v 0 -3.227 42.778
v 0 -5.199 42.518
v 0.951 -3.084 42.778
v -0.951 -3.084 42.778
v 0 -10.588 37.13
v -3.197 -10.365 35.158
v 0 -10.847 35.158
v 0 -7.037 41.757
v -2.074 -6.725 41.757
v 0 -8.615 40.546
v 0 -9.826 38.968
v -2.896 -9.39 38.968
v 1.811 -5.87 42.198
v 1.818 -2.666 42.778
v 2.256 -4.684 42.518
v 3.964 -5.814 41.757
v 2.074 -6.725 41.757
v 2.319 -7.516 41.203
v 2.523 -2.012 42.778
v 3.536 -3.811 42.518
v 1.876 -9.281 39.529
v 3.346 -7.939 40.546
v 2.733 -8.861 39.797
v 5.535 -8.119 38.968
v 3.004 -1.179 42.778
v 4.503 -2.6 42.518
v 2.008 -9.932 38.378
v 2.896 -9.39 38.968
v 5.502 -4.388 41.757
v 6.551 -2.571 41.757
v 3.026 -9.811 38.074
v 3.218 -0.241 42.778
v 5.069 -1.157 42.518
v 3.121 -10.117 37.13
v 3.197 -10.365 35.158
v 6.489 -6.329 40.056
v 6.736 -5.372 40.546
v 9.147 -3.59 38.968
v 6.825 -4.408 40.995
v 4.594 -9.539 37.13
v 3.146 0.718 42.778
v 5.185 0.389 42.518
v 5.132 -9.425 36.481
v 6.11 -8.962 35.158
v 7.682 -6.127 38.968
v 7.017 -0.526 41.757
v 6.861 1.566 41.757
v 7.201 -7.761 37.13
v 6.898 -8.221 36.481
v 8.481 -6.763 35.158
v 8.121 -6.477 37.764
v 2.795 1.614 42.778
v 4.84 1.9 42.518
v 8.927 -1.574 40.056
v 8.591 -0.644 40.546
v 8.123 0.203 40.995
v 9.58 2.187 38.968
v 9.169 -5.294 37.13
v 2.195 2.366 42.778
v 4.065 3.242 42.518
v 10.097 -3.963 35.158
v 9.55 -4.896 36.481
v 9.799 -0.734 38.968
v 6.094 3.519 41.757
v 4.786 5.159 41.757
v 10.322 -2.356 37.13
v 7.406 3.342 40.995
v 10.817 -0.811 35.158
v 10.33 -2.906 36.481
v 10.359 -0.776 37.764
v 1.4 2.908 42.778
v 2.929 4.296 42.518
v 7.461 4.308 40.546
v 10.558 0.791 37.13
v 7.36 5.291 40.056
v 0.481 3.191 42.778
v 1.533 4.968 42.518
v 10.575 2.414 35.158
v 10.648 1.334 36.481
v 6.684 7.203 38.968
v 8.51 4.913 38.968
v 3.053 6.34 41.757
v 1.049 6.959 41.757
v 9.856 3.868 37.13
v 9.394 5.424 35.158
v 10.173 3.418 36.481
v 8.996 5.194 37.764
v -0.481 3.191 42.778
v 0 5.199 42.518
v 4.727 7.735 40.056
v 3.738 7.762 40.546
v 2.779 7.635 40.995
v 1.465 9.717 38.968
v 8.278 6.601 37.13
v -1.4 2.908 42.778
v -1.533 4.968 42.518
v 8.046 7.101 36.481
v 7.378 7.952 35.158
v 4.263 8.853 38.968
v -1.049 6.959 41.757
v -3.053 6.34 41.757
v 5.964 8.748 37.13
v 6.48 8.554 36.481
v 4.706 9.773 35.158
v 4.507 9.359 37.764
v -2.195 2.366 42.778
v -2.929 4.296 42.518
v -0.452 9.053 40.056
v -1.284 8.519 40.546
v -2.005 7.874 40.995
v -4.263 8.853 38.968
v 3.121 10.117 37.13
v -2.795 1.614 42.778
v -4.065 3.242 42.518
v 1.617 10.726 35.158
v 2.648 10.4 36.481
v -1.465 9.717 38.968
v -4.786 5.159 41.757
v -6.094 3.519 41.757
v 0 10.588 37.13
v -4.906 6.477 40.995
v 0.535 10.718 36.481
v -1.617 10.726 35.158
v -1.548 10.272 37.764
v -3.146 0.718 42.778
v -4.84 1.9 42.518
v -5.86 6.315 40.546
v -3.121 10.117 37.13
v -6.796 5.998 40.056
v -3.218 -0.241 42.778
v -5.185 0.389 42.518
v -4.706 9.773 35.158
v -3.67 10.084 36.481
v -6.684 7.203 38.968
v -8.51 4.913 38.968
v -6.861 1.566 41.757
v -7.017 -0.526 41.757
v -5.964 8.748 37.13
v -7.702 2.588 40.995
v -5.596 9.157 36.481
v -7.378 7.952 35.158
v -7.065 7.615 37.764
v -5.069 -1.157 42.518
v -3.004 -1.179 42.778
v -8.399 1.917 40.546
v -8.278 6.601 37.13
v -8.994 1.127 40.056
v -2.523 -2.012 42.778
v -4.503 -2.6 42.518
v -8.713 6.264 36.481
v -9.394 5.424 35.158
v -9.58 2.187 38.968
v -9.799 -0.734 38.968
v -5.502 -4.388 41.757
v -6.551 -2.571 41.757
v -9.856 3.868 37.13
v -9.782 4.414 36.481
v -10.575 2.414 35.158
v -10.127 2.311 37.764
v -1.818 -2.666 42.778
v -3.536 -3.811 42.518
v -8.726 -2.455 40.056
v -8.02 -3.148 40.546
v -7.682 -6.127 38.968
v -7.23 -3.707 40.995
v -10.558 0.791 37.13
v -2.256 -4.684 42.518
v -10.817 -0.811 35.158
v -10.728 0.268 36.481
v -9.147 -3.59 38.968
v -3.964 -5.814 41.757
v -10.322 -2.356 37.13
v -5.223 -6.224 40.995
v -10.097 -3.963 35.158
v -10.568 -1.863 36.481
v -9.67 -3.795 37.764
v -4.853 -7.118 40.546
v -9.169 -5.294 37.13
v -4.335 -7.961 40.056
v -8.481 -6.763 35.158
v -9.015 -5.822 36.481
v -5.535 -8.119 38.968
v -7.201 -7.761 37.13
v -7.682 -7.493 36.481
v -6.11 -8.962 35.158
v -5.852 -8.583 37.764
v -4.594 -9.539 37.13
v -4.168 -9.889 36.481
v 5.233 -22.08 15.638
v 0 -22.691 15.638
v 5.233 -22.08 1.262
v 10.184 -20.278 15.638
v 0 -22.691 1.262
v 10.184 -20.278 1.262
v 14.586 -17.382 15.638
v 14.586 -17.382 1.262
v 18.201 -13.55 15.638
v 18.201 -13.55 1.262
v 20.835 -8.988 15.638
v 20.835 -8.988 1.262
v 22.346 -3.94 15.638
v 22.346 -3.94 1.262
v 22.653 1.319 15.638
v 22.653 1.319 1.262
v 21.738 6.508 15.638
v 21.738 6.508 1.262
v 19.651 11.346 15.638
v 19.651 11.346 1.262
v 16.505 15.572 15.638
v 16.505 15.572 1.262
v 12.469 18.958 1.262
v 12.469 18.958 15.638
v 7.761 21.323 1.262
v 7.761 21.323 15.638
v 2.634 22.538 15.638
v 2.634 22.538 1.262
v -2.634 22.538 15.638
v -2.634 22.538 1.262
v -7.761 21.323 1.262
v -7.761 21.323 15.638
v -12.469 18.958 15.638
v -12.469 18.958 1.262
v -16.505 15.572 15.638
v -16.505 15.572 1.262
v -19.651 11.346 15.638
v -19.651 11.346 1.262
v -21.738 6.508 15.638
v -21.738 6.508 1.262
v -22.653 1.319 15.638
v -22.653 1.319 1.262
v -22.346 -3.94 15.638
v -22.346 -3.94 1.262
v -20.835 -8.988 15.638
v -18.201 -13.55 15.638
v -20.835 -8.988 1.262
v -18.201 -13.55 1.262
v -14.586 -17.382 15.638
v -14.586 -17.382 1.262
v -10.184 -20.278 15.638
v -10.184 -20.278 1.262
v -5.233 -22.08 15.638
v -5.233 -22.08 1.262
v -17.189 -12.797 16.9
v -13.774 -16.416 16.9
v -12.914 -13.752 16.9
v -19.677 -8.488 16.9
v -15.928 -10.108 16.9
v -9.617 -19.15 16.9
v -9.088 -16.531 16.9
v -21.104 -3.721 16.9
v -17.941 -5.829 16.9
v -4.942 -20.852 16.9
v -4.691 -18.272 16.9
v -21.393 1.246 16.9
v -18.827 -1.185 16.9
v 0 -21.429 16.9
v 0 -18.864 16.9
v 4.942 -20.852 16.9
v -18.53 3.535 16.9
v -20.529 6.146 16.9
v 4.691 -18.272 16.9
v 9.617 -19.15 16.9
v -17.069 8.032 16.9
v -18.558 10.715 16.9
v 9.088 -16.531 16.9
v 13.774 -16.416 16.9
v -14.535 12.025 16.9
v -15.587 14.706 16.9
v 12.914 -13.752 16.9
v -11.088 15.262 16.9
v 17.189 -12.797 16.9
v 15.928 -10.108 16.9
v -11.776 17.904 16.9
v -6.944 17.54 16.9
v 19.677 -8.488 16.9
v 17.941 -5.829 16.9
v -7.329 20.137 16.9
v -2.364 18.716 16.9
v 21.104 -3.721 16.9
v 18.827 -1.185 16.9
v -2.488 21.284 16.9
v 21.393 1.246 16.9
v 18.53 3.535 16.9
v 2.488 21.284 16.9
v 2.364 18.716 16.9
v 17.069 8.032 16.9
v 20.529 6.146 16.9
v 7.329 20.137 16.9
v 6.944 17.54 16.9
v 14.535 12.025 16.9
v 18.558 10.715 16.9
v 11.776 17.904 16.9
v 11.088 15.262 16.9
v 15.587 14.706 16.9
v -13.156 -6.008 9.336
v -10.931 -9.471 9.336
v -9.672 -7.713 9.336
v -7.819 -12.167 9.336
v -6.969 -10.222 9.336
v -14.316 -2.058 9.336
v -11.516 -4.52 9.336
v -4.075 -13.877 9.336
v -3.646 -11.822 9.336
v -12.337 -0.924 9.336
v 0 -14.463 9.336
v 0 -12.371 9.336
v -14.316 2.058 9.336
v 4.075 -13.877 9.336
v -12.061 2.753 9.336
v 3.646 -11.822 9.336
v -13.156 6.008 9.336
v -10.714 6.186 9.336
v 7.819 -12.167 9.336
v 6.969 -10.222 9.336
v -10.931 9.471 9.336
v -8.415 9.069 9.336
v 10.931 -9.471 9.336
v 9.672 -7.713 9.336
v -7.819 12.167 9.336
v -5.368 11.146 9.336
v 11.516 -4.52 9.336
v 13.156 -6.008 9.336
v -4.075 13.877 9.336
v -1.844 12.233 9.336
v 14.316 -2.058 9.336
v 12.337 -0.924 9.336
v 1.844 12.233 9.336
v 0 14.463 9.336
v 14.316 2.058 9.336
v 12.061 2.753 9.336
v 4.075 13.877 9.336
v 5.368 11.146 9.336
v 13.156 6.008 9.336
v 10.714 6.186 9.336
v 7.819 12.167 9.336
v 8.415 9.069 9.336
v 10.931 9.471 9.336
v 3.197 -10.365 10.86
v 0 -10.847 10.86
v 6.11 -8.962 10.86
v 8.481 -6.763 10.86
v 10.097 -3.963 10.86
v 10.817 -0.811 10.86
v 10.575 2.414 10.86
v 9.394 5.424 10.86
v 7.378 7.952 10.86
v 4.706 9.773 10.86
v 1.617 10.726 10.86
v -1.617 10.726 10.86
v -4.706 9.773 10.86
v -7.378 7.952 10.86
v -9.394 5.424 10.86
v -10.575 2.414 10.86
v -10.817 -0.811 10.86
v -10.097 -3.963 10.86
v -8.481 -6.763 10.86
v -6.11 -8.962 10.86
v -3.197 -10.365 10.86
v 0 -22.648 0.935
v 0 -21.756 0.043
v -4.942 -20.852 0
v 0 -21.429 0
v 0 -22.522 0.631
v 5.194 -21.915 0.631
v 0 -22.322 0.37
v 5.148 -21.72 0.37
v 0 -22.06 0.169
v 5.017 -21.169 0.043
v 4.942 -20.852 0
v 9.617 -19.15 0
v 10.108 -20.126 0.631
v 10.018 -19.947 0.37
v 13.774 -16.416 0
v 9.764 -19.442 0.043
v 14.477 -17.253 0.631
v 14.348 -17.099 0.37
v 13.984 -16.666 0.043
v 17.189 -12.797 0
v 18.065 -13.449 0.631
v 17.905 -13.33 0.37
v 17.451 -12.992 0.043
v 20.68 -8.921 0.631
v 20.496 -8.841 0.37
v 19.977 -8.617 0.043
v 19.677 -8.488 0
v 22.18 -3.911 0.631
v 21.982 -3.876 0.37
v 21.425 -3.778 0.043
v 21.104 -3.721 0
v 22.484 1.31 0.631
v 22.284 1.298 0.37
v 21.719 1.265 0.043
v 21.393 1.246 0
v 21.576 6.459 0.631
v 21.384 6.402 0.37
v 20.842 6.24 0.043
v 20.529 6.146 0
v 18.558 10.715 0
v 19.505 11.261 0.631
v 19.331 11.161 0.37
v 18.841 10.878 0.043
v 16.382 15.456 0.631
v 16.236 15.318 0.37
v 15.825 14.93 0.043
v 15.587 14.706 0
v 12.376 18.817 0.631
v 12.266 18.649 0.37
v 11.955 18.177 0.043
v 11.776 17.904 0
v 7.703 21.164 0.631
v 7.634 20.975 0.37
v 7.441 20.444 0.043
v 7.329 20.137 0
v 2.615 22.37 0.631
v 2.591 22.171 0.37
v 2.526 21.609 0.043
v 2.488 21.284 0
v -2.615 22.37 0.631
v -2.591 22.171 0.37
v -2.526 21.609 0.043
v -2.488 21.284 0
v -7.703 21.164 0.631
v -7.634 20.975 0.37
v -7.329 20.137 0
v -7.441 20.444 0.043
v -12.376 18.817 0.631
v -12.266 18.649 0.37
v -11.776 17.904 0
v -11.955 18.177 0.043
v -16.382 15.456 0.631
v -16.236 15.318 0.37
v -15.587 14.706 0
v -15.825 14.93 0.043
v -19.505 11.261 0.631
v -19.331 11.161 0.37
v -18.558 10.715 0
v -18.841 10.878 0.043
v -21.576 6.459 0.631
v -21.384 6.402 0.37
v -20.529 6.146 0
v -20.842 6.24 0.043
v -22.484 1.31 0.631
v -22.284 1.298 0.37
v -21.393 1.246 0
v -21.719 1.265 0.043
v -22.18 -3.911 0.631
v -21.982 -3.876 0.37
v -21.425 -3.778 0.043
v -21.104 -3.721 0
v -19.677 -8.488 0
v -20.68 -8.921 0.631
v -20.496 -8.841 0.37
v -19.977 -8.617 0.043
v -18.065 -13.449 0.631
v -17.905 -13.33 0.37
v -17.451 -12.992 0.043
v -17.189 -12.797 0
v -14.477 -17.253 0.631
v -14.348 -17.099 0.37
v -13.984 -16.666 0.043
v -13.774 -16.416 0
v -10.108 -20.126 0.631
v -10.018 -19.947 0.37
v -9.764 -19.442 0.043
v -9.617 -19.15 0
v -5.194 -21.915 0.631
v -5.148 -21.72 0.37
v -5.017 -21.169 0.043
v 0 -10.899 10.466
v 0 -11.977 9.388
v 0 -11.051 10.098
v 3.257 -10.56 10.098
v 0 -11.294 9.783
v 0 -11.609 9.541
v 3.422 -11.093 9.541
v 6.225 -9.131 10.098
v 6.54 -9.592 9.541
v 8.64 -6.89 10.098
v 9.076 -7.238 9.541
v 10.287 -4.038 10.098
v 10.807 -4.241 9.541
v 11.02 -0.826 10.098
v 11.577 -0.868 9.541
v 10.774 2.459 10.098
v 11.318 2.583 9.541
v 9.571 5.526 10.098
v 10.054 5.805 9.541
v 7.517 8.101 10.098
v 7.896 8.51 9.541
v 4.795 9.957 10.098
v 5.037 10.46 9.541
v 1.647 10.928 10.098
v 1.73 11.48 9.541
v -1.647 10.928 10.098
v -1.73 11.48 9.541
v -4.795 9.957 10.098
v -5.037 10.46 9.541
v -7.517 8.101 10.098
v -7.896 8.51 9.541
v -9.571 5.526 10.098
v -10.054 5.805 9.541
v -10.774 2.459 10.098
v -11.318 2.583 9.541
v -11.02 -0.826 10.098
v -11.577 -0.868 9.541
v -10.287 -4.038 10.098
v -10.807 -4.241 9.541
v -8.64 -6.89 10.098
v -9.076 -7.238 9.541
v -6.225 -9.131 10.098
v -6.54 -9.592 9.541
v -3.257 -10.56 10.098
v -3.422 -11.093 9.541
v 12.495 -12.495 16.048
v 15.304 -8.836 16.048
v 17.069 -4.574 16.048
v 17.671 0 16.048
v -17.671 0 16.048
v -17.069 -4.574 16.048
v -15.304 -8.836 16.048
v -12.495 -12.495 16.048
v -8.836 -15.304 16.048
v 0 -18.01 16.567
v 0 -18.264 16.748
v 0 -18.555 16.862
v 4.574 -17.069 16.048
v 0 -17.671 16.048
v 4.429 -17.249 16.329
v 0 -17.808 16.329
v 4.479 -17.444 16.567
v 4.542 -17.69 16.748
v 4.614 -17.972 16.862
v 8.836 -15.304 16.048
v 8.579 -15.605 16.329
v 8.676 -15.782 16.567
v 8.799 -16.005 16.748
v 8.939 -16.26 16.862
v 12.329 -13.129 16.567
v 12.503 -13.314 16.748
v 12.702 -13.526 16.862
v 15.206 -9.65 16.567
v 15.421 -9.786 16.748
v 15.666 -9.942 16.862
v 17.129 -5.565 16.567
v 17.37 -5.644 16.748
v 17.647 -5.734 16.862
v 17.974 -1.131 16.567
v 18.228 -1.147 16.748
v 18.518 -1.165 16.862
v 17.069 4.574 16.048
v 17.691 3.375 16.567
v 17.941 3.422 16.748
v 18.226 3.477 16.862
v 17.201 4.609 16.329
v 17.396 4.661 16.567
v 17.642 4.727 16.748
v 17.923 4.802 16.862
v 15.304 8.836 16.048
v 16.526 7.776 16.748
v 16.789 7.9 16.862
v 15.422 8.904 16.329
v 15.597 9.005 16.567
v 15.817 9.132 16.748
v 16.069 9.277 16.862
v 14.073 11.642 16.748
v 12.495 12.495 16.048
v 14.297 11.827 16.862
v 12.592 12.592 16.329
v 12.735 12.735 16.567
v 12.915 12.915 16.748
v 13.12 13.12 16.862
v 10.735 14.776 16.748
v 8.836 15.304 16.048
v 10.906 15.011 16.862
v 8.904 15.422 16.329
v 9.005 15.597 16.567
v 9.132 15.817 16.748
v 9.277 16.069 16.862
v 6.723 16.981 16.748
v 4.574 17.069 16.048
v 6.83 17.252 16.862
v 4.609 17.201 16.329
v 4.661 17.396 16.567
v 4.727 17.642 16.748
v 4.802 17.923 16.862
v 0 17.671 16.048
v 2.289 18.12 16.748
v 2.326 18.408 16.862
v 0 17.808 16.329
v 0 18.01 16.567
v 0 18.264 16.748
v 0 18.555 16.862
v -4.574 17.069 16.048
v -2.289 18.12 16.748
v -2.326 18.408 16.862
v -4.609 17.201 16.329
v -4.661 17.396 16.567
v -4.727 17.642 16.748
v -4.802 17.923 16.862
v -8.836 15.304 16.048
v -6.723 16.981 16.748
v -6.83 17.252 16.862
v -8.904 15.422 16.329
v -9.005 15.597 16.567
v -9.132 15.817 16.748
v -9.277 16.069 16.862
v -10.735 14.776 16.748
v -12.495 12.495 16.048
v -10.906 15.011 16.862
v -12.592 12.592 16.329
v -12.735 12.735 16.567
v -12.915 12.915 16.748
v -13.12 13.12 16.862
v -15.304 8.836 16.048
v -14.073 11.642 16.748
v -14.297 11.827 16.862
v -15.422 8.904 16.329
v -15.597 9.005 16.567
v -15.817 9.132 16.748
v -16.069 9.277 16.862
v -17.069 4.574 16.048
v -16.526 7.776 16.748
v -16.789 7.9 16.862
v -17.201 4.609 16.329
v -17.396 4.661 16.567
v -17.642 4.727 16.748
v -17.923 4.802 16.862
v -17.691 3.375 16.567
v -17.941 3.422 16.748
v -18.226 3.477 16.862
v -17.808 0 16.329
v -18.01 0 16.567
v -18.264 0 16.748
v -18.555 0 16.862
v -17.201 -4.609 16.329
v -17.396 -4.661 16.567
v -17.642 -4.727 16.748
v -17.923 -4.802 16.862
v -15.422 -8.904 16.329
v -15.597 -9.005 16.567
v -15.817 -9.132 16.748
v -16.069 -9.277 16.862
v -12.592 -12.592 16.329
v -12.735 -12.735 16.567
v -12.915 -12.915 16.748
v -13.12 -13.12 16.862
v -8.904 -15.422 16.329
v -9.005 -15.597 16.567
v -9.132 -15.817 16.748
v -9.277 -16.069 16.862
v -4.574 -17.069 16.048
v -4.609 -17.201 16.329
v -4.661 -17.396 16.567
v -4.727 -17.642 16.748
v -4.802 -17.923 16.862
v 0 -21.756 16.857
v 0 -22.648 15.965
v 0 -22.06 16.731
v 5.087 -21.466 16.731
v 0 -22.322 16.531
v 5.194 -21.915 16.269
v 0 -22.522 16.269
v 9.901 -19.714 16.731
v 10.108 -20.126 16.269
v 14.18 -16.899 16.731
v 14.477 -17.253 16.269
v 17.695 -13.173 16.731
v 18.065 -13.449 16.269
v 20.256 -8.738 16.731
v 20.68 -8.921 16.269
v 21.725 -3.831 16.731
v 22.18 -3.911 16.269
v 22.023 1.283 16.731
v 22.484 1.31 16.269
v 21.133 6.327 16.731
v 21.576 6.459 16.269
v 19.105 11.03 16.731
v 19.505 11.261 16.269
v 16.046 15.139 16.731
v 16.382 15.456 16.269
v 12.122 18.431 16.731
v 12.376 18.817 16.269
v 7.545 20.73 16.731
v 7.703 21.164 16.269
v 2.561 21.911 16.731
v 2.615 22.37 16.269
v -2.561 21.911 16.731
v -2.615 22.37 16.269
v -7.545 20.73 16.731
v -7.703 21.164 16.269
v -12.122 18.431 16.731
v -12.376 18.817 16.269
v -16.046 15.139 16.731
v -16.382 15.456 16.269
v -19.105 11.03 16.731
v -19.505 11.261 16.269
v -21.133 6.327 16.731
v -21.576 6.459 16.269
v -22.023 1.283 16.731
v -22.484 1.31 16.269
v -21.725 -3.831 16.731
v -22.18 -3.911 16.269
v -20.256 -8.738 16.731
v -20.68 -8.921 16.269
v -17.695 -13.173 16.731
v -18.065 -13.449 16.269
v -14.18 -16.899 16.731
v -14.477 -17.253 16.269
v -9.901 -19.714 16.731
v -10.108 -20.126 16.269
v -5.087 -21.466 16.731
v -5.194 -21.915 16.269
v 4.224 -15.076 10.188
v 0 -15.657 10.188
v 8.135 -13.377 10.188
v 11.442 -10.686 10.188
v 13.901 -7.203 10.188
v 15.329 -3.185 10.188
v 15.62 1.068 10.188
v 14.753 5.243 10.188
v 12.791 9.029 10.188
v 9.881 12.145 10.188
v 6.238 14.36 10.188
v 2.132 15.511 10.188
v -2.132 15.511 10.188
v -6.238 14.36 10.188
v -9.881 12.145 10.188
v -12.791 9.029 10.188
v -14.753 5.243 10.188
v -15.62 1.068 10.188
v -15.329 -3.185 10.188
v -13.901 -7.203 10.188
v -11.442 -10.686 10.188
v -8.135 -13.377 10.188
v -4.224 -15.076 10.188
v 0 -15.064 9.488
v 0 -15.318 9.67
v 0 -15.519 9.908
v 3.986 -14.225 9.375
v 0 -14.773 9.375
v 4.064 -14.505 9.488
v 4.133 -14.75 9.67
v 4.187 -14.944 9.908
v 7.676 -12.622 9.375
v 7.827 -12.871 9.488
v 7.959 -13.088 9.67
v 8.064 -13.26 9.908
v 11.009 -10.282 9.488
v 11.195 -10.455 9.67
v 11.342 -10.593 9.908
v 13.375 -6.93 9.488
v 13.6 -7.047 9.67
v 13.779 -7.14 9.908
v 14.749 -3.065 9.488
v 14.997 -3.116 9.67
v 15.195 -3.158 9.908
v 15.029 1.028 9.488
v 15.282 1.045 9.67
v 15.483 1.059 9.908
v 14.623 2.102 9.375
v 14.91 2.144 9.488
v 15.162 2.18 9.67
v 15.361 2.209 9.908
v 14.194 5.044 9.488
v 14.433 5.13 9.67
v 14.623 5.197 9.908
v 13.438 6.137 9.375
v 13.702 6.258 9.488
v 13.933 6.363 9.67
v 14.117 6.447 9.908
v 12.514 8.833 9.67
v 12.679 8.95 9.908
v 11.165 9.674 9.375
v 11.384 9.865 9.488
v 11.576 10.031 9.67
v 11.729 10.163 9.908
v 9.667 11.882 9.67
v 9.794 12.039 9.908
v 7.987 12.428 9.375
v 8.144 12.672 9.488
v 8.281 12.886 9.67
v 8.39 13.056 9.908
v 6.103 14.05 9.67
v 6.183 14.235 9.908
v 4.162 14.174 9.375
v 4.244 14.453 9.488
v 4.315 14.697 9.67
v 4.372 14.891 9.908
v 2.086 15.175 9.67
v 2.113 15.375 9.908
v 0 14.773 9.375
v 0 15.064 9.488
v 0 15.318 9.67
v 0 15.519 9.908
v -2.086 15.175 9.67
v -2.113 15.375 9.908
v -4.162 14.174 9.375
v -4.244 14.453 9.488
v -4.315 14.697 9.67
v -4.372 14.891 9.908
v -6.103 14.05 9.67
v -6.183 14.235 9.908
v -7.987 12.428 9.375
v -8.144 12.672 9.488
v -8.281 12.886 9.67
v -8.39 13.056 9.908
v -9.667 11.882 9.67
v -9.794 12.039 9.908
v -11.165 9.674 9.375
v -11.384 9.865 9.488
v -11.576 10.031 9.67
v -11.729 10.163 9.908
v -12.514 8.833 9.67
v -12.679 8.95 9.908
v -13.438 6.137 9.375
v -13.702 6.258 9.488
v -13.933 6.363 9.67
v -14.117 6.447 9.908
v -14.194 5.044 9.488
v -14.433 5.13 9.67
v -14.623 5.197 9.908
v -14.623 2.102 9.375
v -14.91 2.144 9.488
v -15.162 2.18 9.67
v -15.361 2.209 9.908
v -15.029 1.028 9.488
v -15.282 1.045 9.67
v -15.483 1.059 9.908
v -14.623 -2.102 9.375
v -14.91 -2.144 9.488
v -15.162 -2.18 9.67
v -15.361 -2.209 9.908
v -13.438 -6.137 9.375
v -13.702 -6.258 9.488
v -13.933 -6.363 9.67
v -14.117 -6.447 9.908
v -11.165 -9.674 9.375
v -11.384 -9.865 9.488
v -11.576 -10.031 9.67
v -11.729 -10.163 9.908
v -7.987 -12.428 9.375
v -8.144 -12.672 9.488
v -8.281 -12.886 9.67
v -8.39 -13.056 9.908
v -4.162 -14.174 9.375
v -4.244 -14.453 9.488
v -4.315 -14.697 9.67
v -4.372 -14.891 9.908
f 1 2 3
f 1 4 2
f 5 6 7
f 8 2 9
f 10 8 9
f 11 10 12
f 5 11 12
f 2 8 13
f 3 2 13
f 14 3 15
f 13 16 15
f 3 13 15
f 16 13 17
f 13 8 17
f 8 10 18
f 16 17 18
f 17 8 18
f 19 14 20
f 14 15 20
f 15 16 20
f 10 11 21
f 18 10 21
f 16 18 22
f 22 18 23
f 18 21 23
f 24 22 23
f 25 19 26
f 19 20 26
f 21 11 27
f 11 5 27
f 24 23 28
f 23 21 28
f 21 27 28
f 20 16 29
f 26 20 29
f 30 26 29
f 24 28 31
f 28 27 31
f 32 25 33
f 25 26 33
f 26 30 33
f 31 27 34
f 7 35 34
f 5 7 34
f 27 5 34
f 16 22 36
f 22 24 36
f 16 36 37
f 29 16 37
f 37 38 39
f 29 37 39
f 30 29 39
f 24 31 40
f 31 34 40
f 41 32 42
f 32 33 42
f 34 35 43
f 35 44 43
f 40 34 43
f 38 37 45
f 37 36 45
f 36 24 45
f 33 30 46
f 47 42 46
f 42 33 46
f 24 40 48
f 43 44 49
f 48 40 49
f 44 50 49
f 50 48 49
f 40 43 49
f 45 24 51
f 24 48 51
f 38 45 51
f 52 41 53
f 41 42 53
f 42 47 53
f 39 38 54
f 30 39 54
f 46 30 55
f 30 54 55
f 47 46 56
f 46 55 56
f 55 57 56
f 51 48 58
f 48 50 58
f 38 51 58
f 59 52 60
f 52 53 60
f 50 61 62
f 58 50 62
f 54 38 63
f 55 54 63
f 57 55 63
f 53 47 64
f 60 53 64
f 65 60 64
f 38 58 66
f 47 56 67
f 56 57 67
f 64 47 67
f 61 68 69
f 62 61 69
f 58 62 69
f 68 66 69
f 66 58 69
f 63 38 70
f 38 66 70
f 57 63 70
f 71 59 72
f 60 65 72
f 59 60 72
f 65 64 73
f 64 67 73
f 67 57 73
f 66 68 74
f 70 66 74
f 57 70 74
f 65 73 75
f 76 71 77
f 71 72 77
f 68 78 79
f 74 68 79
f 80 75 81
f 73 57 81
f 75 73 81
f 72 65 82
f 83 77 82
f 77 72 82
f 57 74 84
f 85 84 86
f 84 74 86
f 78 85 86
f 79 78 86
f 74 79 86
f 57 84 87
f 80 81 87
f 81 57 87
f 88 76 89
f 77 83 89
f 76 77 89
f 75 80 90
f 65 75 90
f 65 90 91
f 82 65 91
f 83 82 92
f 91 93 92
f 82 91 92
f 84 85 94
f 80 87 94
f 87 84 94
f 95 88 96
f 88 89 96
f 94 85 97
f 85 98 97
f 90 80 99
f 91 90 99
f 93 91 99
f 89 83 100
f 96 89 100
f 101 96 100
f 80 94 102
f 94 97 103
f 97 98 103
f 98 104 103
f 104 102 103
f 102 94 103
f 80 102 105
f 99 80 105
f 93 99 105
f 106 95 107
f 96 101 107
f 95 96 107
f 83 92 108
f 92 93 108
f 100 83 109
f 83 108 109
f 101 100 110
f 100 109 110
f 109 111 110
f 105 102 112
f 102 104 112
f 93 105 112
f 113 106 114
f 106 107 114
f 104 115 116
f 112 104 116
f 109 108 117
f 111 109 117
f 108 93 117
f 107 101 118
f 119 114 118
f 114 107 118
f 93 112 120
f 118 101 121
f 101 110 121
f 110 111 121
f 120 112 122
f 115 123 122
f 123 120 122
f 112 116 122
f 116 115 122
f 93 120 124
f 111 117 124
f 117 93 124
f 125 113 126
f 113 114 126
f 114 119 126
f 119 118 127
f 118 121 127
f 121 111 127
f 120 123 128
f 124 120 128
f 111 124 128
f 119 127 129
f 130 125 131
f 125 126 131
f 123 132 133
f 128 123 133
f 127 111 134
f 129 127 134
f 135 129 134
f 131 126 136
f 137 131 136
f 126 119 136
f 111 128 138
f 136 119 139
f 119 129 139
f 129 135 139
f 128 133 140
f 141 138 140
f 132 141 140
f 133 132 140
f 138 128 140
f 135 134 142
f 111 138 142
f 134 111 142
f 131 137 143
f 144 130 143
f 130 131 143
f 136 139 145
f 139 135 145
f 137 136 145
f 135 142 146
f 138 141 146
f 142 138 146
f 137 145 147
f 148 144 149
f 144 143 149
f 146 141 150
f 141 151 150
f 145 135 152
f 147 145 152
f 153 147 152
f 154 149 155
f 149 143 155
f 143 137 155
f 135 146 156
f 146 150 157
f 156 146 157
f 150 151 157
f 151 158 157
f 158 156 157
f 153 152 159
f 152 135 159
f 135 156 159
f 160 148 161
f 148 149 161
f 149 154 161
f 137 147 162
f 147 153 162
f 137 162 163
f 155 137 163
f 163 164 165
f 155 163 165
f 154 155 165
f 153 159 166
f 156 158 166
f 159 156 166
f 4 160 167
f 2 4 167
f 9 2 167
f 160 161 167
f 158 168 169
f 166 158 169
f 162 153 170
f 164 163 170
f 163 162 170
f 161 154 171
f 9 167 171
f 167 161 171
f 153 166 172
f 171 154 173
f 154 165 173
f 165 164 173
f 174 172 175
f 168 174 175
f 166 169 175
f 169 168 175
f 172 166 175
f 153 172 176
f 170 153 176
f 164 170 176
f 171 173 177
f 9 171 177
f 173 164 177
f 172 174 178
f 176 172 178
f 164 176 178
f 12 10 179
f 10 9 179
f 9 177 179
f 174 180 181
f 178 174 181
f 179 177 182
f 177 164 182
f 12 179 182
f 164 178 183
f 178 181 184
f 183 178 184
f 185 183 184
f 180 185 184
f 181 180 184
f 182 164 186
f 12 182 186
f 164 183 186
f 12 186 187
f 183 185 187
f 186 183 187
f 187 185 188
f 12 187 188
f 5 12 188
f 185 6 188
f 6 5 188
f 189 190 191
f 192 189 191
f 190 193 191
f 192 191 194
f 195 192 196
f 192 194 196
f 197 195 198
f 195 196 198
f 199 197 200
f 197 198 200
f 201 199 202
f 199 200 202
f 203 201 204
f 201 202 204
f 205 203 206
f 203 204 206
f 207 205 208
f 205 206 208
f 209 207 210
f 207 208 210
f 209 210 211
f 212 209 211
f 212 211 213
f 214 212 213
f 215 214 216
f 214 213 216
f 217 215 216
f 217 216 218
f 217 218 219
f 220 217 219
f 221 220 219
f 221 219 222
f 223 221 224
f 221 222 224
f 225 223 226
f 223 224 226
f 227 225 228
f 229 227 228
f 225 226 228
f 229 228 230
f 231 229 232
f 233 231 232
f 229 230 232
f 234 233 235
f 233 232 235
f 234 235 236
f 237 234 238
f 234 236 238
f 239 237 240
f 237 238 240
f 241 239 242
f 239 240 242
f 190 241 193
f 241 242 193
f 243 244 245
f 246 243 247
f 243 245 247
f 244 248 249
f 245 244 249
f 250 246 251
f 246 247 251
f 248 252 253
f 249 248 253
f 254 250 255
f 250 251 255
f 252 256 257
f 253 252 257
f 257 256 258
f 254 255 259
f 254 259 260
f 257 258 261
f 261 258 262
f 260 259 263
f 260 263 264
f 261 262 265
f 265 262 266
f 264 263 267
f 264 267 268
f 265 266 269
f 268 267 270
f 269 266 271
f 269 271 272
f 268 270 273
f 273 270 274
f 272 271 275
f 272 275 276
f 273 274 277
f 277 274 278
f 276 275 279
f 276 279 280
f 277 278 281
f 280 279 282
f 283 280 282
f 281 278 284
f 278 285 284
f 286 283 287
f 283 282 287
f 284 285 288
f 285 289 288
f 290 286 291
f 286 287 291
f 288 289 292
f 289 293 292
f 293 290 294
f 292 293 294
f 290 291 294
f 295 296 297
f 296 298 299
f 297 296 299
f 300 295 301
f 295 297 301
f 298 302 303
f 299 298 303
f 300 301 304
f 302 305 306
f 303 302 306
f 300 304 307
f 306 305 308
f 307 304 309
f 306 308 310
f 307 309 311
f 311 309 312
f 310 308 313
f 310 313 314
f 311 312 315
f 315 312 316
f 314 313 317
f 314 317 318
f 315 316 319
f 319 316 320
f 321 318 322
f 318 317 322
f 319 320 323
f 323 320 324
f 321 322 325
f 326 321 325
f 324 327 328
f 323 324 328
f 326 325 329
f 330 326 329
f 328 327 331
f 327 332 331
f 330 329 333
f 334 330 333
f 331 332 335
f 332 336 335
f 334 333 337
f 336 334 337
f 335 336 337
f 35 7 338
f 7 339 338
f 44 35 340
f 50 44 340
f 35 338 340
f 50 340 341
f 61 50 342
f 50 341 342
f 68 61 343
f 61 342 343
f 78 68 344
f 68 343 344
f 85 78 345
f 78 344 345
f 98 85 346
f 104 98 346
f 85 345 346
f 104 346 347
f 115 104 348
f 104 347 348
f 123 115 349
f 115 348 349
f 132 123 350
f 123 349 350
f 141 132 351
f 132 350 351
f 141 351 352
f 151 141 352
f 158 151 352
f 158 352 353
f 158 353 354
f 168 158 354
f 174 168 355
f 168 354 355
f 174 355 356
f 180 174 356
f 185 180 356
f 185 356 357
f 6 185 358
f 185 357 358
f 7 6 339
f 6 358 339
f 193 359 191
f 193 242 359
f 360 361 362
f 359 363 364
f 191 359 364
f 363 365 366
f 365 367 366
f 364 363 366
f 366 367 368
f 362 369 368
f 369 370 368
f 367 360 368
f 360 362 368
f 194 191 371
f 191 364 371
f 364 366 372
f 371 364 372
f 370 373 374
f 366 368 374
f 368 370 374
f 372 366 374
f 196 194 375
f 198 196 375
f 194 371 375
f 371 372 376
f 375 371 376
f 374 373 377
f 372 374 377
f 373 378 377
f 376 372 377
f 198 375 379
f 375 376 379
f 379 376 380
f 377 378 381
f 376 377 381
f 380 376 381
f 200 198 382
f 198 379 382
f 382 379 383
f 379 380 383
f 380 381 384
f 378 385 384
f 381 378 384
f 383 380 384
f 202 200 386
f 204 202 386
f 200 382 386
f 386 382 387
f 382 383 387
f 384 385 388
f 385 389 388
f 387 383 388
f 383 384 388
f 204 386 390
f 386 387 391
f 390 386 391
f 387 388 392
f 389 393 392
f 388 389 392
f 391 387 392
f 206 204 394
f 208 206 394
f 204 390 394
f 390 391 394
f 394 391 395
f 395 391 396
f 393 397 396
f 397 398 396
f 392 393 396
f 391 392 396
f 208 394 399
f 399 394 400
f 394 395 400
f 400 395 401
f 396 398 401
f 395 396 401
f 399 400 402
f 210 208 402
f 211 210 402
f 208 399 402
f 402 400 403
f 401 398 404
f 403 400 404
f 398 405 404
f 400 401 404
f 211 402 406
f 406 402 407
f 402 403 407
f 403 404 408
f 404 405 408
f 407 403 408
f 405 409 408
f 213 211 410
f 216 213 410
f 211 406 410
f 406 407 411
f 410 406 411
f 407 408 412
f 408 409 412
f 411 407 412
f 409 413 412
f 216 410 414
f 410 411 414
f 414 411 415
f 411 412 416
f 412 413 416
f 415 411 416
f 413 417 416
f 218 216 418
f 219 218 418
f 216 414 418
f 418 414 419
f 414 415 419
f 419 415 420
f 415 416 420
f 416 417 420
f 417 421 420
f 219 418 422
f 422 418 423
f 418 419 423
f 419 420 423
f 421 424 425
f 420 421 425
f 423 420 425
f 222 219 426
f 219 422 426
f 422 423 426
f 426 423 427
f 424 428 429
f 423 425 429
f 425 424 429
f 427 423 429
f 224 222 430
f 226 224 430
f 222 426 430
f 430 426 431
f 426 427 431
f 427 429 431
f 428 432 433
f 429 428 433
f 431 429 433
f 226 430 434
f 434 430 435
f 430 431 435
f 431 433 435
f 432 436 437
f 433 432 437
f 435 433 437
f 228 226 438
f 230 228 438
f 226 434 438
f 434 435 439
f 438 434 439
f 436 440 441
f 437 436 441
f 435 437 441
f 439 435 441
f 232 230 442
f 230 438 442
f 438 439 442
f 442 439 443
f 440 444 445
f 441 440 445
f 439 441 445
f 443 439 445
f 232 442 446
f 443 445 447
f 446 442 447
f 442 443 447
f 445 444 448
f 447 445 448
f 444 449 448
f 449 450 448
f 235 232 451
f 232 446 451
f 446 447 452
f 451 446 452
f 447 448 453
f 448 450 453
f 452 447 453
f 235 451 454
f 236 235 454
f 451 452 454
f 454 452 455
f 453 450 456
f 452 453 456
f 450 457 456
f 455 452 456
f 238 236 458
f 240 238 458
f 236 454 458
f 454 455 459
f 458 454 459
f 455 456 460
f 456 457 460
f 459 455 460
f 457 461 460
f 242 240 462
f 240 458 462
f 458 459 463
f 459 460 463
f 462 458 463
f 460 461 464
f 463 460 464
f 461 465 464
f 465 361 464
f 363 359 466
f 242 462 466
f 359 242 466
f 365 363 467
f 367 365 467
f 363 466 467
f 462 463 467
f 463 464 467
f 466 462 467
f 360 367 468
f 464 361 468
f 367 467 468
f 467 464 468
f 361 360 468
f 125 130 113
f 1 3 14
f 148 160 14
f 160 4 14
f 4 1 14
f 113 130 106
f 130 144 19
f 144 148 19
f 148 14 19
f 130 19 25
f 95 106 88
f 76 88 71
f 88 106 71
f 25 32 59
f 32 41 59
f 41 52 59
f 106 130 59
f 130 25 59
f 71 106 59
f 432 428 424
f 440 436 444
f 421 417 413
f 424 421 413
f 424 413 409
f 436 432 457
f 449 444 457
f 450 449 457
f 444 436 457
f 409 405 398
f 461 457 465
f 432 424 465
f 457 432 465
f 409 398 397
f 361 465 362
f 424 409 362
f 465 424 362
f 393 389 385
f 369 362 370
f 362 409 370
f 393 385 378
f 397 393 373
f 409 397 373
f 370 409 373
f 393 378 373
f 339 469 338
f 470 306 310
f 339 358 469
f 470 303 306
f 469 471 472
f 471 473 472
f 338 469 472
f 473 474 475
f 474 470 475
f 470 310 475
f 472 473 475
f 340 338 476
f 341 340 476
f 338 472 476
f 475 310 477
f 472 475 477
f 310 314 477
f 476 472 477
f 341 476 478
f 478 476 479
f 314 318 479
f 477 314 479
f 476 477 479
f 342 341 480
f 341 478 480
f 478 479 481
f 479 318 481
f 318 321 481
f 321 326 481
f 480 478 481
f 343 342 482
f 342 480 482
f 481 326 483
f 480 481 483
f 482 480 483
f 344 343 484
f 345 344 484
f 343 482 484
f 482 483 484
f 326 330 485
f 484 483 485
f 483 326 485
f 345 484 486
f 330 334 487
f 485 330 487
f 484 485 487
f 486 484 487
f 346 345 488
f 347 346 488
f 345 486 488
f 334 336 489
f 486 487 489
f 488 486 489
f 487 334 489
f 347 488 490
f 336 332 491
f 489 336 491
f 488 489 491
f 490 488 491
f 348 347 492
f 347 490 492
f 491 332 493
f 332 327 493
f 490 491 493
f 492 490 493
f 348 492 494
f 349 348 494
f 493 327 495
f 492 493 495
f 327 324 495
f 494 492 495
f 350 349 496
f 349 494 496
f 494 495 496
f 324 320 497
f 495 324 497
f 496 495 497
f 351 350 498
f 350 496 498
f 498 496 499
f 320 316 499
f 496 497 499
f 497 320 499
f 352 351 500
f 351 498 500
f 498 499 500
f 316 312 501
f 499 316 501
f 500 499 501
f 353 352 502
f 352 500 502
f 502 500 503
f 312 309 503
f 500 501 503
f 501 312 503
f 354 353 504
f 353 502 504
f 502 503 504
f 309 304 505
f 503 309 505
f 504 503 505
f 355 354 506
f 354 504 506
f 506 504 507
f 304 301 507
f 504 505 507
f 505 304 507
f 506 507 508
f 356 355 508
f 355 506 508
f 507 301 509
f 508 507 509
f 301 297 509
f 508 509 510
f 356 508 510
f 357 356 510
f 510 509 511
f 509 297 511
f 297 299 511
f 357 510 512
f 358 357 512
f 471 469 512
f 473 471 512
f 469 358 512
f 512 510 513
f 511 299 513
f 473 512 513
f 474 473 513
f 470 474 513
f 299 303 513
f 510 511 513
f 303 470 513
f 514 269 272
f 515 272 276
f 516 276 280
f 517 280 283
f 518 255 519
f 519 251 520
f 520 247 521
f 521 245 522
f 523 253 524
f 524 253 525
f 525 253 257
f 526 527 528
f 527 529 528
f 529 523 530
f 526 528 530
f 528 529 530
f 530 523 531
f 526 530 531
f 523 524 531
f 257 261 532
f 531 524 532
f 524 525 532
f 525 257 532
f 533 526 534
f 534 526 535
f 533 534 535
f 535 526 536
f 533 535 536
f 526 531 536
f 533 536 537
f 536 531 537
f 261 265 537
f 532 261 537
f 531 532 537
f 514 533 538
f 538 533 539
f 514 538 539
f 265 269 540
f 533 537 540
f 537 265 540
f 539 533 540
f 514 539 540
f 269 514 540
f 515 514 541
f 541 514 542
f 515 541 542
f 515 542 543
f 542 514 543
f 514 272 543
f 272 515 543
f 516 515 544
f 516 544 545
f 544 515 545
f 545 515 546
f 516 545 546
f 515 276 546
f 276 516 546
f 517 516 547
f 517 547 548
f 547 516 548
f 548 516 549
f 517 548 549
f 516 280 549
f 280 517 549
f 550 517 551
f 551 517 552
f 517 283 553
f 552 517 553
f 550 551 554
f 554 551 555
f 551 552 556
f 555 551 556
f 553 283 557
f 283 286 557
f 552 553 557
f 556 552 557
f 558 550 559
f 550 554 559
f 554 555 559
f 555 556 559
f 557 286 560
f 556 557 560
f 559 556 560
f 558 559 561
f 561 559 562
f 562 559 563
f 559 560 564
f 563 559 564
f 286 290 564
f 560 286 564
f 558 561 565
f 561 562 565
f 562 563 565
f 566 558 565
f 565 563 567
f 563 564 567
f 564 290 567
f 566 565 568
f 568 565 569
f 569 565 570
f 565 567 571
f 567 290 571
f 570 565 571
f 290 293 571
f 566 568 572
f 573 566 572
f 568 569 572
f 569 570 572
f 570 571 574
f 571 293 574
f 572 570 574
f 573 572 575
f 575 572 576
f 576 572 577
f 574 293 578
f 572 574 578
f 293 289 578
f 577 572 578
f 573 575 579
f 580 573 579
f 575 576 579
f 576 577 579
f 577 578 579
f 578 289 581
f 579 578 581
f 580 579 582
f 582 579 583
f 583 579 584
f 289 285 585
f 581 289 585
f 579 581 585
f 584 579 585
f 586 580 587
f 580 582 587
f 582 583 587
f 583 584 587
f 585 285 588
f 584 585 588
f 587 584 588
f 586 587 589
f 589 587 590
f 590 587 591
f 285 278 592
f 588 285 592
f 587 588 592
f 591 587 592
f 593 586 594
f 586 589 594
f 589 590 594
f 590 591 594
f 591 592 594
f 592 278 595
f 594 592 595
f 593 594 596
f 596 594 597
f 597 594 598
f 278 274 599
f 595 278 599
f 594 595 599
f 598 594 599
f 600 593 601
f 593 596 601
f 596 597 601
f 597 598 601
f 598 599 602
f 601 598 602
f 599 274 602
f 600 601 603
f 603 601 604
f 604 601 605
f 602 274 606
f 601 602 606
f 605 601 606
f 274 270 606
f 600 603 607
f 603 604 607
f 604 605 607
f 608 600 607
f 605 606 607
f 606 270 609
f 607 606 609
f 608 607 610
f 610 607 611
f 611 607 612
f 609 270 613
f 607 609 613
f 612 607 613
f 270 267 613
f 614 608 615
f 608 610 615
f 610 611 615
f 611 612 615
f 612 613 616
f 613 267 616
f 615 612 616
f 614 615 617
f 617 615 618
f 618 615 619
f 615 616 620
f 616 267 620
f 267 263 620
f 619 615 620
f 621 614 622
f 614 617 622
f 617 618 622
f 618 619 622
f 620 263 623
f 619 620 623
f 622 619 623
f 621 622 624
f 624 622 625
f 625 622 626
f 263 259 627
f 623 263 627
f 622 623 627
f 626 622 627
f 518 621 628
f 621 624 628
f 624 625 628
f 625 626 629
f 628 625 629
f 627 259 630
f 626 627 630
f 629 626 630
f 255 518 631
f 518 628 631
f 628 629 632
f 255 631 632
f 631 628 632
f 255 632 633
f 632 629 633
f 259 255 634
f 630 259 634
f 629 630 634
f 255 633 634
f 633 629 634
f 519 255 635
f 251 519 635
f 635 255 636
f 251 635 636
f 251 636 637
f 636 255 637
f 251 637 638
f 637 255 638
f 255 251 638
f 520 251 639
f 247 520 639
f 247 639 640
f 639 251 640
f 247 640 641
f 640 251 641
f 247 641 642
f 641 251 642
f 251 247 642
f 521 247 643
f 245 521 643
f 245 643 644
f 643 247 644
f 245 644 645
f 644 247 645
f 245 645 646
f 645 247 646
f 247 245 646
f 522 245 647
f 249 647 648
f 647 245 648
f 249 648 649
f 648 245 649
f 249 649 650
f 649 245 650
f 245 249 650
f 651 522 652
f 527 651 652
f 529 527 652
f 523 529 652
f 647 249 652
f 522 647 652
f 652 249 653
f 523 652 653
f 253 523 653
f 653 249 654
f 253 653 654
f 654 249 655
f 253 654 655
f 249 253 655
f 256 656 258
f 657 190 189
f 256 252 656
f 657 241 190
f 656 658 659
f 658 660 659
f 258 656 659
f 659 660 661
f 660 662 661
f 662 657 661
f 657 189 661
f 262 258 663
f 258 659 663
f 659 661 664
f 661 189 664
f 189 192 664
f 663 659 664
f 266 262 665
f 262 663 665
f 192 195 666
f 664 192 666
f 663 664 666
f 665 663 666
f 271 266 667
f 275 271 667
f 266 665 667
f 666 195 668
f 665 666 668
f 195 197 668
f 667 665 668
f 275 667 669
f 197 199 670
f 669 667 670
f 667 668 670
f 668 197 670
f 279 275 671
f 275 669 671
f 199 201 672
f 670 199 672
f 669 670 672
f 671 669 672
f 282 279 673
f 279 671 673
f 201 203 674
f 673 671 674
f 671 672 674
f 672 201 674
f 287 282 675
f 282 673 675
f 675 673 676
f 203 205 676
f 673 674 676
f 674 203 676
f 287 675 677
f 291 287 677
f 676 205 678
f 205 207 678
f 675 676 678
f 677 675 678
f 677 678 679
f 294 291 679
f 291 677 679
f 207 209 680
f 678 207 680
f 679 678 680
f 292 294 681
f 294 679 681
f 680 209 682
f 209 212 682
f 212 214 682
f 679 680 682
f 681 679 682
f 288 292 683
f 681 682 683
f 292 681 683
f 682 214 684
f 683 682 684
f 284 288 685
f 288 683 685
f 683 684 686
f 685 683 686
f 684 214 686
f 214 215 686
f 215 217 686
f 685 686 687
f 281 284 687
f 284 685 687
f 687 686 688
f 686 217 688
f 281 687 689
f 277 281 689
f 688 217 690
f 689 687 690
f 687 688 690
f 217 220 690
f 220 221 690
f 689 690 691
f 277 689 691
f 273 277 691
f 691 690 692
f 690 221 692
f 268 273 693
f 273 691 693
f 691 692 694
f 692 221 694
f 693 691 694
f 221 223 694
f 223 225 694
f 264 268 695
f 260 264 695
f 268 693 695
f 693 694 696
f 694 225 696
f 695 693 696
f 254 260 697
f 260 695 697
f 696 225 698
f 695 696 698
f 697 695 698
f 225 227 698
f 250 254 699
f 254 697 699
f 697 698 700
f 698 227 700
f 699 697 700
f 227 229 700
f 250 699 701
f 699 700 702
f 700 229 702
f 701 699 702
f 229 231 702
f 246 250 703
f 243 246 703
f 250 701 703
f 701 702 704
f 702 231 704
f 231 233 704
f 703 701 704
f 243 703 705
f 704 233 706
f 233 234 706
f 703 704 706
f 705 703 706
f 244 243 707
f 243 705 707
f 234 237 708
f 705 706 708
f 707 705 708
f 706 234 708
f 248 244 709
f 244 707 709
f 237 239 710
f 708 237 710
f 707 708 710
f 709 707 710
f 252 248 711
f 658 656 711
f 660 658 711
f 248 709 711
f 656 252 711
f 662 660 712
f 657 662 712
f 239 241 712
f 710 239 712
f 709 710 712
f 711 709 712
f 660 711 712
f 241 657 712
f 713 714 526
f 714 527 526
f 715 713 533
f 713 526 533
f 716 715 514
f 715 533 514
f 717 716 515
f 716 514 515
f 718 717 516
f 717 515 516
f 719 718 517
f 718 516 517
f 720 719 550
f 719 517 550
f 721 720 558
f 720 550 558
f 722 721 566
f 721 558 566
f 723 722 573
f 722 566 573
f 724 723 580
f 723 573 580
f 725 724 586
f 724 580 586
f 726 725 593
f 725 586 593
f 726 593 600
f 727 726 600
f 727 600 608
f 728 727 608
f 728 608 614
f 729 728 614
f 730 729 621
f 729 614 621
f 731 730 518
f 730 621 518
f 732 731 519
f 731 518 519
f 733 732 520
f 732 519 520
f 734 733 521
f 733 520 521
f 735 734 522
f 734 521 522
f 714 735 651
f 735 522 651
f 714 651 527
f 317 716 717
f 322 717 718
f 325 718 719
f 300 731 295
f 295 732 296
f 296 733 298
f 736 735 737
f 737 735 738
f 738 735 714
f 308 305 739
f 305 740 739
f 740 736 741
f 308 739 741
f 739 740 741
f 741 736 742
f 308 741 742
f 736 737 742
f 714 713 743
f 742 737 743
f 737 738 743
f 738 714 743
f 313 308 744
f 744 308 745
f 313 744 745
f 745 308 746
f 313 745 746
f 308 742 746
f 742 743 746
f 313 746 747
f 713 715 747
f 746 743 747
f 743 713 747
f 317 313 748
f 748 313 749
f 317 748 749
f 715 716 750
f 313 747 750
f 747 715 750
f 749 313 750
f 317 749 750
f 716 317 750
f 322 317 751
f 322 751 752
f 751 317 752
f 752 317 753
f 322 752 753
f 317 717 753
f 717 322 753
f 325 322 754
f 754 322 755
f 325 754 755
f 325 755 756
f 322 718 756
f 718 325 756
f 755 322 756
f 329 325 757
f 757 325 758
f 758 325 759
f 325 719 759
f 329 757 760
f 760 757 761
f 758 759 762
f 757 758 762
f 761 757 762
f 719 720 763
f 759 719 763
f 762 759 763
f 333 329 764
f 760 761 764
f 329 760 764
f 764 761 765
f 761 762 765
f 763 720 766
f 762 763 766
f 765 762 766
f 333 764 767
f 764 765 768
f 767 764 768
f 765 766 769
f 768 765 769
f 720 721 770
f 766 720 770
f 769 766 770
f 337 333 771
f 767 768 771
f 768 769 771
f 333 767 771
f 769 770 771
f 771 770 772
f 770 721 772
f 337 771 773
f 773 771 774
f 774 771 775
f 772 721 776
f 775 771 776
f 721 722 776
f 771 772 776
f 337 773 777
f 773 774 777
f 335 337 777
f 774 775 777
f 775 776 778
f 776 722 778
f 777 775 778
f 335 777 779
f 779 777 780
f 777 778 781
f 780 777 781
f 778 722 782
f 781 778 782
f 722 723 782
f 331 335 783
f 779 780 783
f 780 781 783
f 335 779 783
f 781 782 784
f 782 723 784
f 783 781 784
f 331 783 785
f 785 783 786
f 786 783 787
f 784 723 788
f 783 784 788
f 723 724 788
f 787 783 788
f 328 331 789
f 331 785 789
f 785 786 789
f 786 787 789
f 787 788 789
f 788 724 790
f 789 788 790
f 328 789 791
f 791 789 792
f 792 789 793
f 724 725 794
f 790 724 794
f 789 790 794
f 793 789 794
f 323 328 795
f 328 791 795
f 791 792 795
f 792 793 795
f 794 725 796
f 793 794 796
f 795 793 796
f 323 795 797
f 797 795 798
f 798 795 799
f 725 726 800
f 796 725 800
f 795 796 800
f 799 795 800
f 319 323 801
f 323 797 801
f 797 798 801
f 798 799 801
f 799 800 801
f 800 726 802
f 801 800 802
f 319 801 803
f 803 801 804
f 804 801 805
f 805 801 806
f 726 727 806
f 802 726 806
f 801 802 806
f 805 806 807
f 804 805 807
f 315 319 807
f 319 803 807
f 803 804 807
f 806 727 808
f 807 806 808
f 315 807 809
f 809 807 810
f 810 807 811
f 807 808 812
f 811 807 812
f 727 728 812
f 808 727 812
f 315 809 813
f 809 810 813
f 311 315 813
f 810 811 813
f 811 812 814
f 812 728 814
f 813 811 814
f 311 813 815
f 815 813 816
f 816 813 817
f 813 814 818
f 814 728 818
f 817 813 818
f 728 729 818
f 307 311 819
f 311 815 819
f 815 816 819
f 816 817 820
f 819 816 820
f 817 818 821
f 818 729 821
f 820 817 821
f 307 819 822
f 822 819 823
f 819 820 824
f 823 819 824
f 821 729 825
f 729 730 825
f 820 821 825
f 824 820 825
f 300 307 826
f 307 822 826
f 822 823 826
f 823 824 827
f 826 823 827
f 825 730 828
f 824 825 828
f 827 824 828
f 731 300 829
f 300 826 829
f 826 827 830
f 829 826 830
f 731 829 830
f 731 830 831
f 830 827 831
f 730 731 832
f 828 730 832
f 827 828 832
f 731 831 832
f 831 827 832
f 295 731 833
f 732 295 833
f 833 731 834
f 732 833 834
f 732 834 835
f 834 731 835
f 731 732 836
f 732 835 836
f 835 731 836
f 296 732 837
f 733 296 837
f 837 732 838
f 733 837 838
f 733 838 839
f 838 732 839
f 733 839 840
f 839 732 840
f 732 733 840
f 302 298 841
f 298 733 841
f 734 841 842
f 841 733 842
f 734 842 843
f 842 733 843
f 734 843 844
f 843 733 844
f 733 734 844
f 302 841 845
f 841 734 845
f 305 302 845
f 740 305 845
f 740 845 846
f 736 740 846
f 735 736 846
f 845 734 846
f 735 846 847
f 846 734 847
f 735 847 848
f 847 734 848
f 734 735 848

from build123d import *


with BuildPart() as f1:
    # F0 (on Right) → F1 (revolve)
    with BuildSketch(Plane.YZ):
        with BuildLine():
            Line((-21.429214, 0), (0, 0))
            Line((0, 0), (0, 42.777969))
            Line((0, 42.777969), (-3.227171, 42.777969))
            ThreePointArc((-3.227171, 42.777969), (-8.615325, 40.546123), (-10.847171, 35.157969))
            Line((-10.847171, 35.157969), (-10.847171, 10.86047))
            ThreePointArc((-10.847171, 10.86047), (-11.293541, 9.782839), (-12.371171, 9.33647))
            Line((-12.371171, 9.33647), (-14.463177, 9.33647))
            ThreePointArc((-14.463177, 9.33647), (-15.196262, 9.571237), (-15.65659, 10.188188))
            Line((-15.65659, 10.188188), (-17.671064, 16.048475))
            ThreePointArc((-17.671064, 16.048475), (-18.131391, 16.665426), (-18.864476, 16.900193))
            Line((-18.864476, 16.900193), (-21.429214, 16.900193))
            ThreePointArc((-21.429214, 16.900193), (-22.32155, 16.530575), (-22.691168, 15.638239))
            Line((-22.691168, 15.638239), (-22.691168, 1.261953))
            ThreePointArc((-22.691168, 1.261953), (-22.32155, 0.369618), (-21.429214, 0))
        make_face()
    revolve(axis=Axis((0, 0, 21.388984), (0, 0, 1)))


solid = f1.part
